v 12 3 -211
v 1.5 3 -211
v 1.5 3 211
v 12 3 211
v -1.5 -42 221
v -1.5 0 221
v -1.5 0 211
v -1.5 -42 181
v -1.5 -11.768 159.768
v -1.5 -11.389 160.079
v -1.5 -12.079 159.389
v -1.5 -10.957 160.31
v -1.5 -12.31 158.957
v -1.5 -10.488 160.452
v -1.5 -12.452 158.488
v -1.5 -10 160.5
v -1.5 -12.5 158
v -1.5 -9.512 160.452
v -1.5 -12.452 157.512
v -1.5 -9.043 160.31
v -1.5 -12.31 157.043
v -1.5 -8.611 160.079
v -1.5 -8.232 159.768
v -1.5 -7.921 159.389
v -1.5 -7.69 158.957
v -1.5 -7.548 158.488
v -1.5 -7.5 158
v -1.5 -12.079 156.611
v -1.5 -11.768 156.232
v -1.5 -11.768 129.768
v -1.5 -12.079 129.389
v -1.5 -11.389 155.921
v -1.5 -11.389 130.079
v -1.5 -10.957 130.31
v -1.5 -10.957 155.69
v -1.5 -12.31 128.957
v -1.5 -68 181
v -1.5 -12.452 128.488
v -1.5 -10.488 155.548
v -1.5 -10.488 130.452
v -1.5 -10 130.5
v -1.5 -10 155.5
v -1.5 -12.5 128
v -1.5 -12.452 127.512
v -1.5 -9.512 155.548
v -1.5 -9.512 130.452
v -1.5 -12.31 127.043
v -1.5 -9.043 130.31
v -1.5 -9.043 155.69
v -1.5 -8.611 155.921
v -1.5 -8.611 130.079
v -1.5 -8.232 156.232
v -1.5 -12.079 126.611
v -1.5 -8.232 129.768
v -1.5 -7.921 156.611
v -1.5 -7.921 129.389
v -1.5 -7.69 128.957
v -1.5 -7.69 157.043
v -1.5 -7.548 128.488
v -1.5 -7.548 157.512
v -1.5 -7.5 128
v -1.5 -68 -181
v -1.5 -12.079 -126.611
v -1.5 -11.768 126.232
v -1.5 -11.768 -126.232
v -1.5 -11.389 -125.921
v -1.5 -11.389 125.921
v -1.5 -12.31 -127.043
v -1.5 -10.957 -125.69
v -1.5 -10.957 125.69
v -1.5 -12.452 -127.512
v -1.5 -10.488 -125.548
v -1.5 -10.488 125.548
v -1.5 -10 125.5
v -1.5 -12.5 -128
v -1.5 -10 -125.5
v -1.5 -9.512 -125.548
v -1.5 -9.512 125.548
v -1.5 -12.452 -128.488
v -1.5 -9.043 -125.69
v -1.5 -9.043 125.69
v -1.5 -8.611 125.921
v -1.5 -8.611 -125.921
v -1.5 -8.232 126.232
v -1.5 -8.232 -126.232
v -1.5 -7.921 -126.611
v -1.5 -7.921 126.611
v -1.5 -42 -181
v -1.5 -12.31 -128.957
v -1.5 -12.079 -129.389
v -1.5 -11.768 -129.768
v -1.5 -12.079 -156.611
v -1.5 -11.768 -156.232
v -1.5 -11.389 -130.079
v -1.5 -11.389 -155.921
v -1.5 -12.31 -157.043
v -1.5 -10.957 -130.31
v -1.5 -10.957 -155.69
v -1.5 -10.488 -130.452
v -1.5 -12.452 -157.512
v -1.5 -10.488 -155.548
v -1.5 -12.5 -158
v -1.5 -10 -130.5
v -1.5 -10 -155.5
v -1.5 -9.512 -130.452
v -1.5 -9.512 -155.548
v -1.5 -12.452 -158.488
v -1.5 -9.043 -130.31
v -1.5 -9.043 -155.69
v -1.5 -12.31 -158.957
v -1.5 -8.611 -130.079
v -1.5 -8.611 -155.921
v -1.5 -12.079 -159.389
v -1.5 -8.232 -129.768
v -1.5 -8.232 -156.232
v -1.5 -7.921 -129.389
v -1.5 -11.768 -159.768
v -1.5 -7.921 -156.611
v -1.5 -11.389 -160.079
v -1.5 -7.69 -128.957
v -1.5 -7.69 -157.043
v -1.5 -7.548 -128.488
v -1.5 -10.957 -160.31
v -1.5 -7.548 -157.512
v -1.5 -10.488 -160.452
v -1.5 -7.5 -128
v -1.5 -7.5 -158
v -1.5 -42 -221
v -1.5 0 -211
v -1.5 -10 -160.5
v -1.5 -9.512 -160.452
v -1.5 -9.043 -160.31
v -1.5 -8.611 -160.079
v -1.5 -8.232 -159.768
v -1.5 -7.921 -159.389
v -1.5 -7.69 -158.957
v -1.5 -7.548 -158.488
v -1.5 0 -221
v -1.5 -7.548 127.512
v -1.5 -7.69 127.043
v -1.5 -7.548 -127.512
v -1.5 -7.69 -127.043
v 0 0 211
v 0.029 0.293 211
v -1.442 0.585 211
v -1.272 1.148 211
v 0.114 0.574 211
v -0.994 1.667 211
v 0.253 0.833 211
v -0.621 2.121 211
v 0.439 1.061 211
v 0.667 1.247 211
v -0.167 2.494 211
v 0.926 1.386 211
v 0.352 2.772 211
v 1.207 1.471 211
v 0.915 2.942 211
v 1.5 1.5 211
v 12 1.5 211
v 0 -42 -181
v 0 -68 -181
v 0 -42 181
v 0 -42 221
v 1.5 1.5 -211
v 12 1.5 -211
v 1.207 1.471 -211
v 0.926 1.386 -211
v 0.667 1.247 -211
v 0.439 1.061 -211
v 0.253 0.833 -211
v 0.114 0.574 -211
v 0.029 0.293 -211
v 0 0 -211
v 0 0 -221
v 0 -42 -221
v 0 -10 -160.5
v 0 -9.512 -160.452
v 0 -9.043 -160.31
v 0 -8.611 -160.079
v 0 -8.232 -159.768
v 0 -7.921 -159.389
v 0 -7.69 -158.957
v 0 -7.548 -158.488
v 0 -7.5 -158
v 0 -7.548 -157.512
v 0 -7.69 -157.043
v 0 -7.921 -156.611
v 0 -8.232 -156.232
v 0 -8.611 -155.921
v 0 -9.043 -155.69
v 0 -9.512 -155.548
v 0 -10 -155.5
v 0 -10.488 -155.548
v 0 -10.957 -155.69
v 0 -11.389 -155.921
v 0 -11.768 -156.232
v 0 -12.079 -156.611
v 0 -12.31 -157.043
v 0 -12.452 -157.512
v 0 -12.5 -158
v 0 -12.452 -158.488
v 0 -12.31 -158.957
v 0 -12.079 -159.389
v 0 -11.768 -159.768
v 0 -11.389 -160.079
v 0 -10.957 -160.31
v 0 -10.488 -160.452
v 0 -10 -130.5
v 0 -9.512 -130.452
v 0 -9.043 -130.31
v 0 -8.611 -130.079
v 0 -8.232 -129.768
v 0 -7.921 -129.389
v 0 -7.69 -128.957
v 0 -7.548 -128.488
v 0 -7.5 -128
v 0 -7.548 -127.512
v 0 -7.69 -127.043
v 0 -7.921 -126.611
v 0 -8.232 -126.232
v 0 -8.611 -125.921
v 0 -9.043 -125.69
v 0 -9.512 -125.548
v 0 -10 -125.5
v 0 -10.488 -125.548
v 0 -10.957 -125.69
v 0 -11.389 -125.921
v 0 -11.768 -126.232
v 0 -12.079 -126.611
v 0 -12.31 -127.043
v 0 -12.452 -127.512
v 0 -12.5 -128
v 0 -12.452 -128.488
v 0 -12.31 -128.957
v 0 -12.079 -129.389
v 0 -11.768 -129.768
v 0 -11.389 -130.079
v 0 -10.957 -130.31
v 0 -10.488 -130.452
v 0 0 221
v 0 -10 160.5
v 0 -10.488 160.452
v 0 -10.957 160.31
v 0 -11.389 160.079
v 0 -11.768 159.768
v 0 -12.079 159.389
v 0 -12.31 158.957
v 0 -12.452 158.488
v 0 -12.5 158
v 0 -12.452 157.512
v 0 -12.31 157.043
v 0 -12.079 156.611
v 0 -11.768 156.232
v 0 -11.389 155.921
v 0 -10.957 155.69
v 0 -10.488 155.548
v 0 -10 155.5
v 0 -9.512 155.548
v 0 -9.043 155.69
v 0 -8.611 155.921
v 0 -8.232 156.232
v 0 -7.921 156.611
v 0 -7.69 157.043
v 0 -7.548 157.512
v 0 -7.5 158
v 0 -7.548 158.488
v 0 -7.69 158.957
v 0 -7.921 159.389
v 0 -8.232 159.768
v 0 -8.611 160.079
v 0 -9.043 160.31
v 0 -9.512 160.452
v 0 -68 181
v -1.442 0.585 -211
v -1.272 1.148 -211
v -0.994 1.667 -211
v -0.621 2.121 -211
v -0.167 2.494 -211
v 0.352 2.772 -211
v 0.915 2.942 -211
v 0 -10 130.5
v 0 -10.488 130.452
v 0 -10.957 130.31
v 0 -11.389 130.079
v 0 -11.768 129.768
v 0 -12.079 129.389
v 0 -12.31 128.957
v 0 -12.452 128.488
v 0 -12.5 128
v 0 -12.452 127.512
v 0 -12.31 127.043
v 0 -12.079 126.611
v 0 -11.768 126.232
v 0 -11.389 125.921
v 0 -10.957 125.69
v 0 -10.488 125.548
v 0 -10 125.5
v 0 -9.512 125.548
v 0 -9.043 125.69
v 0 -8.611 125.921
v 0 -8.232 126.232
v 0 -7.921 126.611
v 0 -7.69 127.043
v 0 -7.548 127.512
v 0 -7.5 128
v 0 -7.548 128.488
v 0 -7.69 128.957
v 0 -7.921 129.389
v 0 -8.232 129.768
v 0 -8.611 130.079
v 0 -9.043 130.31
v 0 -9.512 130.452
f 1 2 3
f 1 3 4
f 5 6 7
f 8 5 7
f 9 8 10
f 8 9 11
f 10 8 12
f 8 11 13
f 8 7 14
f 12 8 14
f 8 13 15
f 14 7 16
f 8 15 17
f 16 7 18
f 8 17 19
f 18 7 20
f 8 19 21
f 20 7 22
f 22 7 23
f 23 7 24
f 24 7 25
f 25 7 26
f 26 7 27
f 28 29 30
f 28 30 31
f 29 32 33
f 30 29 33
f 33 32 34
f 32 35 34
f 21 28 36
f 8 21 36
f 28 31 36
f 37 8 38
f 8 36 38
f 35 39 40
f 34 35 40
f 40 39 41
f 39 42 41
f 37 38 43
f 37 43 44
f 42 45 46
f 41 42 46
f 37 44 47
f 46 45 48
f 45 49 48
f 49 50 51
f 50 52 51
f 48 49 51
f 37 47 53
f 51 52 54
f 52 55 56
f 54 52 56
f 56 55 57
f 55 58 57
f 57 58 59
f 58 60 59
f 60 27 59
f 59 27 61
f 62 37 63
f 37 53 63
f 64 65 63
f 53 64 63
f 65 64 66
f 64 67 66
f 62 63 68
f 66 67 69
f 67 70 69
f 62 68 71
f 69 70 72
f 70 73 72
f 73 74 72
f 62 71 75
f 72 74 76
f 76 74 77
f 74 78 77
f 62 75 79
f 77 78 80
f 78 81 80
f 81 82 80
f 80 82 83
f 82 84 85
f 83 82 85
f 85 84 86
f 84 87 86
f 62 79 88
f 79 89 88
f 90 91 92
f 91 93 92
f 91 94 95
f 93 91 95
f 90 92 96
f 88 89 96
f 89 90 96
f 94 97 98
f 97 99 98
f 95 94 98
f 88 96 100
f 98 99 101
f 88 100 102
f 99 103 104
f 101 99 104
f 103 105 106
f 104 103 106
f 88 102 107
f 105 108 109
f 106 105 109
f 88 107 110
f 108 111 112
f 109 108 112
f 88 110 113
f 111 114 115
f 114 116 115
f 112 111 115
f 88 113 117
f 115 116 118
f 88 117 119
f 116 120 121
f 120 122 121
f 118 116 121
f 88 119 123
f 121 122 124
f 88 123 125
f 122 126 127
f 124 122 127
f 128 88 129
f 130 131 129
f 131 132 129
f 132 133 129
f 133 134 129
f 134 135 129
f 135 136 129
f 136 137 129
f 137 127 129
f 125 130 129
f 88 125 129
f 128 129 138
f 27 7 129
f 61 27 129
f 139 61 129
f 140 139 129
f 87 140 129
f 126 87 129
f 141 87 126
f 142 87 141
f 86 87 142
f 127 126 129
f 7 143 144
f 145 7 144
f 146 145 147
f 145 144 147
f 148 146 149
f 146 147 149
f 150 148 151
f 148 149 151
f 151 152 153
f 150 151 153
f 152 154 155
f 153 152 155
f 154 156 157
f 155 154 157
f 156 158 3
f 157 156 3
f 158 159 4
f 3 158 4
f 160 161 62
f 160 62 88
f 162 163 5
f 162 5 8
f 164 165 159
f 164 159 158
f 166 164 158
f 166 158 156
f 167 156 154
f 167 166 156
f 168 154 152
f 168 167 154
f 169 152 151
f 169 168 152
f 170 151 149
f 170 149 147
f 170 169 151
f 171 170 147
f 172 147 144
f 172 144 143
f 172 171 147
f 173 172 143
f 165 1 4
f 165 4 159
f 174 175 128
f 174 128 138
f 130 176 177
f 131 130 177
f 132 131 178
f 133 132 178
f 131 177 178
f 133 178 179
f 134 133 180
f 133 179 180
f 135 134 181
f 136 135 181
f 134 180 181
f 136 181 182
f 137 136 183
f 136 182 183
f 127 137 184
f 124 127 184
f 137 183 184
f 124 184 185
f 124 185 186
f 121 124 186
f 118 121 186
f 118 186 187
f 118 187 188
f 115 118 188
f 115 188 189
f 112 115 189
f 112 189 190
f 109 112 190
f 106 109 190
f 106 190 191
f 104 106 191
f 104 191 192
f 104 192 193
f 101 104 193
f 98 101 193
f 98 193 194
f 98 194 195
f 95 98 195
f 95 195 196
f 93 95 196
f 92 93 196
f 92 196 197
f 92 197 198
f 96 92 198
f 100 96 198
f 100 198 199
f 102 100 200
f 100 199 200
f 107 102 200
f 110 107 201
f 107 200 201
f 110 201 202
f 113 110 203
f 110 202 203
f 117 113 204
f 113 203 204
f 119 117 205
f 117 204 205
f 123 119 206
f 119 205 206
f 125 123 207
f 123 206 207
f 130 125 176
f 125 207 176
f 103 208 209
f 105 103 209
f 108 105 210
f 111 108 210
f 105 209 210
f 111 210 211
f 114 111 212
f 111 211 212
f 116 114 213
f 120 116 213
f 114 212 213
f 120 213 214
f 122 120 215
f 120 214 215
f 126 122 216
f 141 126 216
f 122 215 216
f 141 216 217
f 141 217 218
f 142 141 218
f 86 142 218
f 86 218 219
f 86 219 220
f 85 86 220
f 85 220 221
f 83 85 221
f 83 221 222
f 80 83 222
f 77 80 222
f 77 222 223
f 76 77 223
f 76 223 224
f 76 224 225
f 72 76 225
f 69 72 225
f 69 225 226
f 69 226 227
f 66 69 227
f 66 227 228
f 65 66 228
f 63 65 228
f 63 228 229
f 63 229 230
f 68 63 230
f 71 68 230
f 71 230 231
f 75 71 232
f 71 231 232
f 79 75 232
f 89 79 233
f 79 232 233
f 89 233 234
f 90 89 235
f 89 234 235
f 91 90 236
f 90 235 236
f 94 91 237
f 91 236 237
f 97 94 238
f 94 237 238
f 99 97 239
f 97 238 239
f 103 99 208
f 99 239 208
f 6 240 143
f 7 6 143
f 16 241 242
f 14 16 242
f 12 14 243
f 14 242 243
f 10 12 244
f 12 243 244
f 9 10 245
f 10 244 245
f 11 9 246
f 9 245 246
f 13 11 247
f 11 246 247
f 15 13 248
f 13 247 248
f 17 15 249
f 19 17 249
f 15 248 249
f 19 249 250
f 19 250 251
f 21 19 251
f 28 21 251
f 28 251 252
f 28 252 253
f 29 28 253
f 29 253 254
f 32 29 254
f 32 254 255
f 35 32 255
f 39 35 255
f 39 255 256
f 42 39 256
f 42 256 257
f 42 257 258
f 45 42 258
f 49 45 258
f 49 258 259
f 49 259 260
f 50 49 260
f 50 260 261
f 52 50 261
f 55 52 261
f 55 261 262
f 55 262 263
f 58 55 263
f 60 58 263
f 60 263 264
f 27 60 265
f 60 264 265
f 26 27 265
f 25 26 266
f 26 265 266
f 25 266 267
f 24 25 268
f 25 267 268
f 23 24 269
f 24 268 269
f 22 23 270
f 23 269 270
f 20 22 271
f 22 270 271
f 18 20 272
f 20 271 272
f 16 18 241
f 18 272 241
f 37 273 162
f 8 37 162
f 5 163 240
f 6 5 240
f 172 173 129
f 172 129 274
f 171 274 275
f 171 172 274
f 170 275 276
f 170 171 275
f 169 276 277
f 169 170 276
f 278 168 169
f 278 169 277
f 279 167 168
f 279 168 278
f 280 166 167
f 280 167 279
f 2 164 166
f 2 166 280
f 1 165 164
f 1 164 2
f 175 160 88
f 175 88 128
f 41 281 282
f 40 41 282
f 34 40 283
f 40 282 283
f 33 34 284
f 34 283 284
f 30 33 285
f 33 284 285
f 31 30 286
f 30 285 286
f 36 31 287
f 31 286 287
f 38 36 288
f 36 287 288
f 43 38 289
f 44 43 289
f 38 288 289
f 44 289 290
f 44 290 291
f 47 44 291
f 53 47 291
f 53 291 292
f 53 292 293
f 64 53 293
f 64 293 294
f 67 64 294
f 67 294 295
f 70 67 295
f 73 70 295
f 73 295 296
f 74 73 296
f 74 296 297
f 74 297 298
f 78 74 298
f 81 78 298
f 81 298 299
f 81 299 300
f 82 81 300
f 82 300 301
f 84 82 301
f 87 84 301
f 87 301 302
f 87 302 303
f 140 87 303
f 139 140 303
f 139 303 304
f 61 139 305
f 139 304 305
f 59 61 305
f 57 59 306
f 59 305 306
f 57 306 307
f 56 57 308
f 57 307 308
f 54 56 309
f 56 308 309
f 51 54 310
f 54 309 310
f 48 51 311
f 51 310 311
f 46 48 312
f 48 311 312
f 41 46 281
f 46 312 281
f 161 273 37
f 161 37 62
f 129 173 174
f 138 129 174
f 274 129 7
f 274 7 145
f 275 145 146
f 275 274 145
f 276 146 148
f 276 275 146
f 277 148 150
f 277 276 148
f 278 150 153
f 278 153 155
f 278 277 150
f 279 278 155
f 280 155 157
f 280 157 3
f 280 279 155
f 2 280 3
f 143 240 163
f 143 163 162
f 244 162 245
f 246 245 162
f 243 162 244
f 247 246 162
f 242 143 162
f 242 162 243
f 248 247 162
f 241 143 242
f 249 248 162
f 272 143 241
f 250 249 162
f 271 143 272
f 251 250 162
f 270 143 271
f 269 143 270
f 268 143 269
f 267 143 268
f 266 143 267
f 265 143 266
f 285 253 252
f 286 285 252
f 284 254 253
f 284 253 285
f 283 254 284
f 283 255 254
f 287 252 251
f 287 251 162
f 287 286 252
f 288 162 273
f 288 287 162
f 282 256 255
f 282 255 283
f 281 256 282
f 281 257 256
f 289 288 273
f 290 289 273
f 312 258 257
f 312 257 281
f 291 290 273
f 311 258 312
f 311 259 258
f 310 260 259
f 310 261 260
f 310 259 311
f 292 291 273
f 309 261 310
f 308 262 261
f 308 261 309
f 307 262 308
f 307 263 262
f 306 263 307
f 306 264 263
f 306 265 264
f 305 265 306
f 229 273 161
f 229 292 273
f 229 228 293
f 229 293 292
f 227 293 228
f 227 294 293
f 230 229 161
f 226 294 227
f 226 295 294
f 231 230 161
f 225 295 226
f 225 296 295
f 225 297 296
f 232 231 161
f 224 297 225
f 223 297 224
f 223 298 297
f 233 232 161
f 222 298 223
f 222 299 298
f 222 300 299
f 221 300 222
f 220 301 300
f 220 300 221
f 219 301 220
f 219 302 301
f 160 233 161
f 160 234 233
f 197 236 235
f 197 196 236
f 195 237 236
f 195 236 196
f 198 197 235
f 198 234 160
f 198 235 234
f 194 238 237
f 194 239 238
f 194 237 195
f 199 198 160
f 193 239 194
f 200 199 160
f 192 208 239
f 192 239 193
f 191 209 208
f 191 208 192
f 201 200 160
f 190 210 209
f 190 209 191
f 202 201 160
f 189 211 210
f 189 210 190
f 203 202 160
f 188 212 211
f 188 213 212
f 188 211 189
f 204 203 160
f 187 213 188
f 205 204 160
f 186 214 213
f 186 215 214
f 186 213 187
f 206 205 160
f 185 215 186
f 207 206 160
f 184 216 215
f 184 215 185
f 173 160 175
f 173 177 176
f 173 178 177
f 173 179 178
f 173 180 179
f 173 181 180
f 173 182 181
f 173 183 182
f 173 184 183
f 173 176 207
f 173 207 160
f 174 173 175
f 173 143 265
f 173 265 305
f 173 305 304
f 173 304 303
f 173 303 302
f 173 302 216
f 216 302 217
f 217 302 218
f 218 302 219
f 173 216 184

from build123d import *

# Parameters (mm, degrees)
SKETCH_1_W               = 362
SKETCH_1_H               = 68
SM_BASE_FLANGE_1_DEPTH   = 1.5
SKETCH_6_R               = 2.5
CUT_EXTRUDE_1_DEPTH      = 10
SKETCH_7_W               = 40
SKETCH_7_H               = 42
SM_BASE_FLANGE_1_2_DEPTH = 1.5
SM_EDGE_FLANGE_1_DEPTH   = 422


# Sheet-metal steps are written as plain solids
with BuildPart() as part:
    # Sketch 1 → Sm Base Flange 1 (new body)
    with BuildSketch(Plane(origin=(0, 0, 0), x_dir=(0, 0, -1), z_dir=(1, 0, 0))):
        with Locations((0, -34)):
            Rectangle(SKETCH_1_W, SKETCH_1_H)
    extrude(amount=-SM_BASE_FLANGE_1_DEPTH)

    # Эскиз6 → Вырез-Вытянуть1 (cut)
    with BuildSketch(Plane(origin=(0, 0, 0), x_dir=(0, 0, -1), z_dir=(1, 0, 0))):
        with Locations((158, -10)):
            Circle(SKETCH_6_R)
        with Locations((128, -10)):
            Circle(SKETCH_6_R)
        with Locations(Location((-128, -10, 0), (0, 0, 180))):
            Circle(SKETCH_6_R)
        with Locations(Location((-158, -10, 0), (0, 0, 180))):
            Circle(SKETCH_6_R)
    extrude(amount=-CUT_EXTRUDE_1_DEPTH, mode=Mode.SUBTRACT)

    # Эскиз7 → Sm Base Flange 1 2 (add)
    with BuildSketch(Plane(origin=(0, 0, 0), x_dir=(0, 0, -1), z_dir=(1, 0, 0))):
        with Locations((-201, -21)):
            Rectangle(SKETCH_7_W, SKETCH_7_H)
        with Locations((201, -21)):
            Rectangle(SKETCH_7_W, SKETCH_7_H)
    extrude(amount=-SM_BASE_FLANGE_1_2_DEPTH)

    # Ребро-кромка1 section (across the edge) → Ребро-кромка1 (add)
    with BuildSketch(Plane(origin=(0, 1.5, -211), x_dir=(0, -1, 0), z_dir=(0, 0, 1))):
        with BuildLine():
            Line((-1.5, 1.5), (-1.5, 12))
            Line((-1.5, 12), (0, 12))
            Line((0, 12), (0, 1.5))
            ThreePointArc((0, 1.5), (0.439339828, 0.439339828), (1.5, 0))
            Line((1.5, 0), (1.5, -1.5))
            ThreePointArc((1.5, -1.5), (-0.621320344, -0.621320344), (-1.5, 1.5))
        make_face()
    extrude(amount=SM_EDGE_FLANGE_1_DEPTH)


solid = part.part
